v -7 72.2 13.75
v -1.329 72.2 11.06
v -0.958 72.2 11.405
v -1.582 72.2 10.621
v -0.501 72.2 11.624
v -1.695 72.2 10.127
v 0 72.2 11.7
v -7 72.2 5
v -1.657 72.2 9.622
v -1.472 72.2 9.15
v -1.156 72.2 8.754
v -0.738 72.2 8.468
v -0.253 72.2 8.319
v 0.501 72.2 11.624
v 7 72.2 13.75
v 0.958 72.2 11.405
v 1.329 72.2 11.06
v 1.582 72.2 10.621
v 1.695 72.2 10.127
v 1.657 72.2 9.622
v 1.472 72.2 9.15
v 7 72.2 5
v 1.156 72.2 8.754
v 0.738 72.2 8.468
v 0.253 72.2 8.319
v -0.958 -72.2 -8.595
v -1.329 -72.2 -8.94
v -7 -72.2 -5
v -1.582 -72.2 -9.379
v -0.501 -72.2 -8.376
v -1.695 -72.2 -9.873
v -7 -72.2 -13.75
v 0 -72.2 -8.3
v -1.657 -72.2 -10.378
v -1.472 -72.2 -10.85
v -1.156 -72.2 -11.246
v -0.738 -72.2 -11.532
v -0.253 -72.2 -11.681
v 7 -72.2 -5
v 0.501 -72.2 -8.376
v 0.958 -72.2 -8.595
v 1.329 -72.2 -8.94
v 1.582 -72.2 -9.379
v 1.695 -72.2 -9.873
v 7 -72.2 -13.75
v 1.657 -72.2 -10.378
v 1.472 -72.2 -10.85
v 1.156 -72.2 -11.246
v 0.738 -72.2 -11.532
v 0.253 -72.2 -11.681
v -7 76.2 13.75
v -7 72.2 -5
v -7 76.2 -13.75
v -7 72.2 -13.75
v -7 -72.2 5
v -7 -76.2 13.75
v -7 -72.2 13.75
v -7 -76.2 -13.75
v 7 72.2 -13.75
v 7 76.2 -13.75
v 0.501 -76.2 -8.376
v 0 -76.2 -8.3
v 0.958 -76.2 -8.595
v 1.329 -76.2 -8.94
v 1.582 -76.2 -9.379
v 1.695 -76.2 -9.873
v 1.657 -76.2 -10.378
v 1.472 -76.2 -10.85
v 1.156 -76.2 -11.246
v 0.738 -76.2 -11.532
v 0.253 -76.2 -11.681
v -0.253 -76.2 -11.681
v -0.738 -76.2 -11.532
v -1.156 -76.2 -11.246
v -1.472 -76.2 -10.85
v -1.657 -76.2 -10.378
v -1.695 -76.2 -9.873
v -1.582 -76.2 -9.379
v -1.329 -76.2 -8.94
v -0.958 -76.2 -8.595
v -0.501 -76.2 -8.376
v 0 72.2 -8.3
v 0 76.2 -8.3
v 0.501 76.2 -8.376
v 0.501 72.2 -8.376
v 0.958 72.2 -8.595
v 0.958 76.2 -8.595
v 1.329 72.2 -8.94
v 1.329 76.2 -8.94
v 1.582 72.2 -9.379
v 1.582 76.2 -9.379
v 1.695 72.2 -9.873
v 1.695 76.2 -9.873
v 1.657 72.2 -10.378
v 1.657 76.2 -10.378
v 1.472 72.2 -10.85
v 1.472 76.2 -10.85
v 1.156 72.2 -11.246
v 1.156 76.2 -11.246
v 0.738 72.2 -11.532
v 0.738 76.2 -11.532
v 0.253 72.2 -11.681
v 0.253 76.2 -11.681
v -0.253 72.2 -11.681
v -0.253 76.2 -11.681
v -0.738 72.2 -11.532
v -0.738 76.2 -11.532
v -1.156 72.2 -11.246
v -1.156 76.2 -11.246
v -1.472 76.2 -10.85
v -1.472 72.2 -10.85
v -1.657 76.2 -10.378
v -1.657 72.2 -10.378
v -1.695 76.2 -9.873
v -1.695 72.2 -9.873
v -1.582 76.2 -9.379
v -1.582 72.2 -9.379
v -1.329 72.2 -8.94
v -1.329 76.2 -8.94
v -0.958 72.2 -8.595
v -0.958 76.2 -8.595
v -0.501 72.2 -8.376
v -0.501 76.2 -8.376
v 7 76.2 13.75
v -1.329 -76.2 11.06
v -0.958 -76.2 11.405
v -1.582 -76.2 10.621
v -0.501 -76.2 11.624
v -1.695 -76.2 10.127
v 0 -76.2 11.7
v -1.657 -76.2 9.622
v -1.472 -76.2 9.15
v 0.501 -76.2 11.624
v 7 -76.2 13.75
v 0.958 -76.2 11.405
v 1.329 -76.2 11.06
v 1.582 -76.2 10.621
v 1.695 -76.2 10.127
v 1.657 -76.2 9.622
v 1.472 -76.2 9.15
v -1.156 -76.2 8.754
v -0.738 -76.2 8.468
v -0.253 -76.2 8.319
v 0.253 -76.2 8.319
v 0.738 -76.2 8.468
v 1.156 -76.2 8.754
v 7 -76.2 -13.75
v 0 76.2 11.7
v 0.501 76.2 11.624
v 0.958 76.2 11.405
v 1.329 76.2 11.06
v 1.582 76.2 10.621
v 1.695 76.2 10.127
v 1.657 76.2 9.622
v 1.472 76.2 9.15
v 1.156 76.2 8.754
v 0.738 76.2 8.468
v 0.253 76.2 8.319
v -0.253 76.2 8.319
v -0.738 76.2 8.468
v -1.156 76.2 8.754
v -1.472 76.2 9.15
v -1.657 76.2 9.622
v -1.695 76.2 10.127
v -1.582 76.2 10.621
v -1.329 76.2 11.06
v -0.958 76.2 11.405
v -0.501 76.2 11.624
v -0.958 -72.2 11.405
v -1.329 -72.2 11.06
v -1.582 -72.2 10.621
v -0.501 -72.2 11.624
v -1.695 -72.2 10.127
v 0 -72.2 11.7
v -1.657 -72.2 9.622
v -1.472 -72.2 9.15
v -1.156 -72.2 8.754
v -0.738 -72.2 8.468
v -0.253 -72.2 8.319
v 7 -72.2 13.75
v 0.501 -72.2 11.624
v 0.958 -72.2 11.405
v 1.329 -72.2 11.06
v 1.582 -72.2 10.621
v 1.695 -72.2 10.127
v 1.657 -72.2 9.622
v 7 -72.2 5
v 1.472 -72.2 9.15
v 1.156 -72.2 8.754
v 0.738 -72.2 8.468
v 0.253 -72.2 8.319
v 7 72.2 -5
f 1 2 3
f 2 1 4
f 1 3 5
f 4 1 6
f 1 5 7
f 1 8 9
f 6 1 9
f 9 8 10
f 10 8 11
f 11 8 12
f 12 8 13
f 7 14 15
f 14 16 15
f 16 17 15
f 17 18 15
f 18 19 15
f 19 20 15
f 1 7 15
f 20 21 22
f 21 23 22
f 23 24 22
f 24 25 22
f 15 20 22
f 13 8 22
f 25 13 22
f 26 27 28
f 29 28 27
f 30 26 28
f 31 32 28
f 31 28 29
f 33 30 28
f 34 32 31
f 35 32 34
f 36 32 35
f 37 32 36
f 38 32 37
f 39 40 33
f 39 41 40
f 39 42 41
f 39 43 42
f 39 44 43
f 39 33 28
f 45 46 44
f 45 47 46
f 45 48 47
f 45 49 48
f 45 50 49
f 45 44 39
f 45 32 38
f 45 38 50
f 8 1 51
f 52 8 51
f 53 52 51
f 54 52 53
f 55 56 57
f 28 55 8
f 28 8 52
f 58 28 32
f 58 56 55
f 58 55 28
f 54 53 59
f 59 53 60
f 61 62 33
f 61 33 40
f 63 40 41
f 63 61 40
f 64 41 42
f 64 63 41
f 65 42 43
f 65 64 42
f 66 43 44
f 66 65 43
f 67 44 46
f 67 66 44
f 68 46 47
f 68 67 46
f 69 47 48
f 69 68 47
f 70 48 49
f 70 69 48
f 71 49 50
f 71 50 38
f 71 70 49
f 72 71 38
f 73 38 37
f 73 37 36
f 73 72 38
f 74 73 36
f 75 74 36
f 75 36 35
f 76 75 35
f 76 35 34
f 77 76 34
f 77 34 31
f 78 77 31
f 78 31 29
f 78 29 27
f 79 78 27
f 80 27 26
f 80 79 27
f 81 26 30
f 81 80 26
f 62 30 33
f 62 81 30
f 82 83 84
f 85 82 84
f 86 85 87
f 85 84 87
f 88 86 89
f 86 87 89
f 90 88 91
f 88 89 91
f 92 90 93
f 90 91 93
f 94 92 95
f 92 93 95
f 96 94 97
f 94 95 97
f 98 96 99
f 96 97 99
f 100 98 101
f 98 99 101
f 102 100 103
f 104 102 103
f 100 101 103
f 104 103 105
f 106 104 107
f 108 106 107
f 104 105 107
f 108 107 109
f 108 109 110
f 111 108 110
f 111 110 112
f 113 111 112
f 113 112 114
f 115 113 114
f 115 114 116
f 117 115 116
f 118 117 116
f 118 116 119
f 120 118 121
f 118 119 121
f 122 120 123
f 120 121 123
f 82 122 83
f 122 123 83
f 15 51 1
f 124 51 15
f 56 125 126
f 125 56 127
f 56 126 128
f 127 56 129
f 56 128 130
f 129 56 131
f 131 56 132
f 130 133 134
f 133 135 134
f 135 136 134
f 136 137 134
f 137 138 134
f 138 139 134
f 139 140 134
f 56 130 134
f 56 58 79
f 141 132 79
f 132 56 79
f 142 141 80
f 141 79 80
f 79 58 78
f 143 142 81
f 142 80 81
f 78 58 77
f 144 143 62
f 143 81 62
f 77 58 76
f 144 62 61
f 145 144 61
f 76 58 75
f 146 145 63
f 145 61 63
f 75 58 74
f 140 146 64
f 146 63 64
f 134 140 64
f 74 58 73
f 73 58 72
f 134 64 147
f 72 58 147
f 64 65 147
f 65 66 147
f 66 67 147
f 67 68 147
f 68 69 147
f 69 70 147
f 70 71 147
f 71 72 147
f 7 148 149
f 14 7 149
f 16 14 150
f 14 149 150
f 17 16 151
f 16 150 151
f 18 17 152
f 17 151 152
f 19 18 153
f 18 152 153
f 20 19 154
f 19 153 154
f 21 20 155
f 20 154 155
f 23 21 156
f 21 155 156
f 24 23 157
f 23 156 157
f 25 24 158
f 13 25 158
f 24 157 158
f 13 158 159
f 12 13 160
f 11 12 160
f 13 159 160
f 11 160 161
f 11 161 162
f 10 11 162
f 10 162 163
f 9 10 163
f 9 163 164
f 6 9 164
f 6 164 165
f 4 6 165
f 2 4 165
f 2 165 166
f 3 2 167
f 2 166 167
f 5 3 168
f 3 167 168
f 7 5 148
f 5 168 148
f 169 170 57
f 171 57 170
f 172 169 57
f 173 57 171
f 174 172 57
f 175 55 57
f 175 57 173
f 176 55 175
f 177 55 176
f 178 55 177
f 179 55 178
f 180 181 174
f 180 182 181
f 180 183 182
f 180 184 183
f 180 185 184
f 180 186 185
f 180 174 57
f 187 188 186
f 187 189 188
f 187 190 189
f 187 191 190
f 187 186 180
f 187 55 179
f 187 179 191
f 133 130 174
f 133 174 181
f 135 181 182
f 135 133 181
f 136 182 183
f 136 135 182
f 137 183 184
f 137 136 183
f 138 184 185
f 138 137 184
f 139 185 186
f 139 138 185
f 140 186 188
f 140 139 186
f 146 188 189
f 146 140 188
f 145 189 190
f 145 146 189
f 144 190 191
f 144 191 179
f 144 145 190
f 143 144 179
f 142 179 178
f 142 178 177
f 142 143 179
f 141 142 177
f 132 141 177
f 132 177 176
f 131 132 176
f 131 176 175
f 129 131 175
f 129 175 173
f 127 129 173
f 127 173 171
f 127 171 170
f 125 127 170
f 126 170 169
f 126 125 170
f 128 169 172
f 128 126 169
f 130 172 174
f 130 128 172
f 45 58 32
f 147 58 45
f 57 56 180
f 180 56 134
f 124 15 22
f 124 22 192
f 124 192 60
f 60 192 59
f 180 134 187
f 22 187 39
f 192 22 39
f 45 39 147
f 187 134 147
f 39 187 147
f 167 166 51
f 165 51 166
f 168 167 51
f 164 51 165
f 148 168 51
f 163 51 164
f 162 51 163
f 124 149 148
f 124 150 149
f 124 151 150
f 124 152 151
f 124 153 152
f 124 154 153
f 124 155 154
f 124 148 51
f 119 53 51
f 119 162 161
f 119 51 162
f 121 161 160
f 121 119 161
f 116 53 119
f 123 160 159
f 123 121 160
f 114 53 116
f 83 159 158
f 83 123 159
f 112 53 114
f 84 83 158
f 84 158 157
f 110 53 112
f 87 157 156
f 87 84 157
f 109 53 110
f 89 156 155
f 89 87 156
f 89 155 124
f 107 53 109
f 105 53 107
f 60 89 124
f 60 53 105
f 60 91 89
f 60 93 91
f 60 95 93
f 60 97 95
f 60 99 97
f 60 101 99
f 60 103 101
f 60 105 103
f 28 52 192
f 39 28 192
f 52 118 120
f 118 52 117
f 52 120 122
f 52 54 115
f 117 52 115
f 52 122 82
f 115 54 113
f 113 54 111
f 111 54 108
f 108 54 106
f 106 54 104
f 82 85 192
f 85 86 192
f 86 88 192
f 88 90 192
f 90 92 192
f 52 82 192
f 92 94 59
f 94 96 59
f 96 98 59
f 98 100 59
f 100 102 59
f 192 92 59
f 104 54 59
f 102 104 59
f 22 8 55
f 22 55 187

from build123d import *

# Parameters (mm, degrees)
SKETCH1_W           = 14
SKETCH1_H           = 10
BOSS_EXTRUDE1_DEPTH = 76.2
SKETCH3_W           = 14
SKETCH3_H           = 27.5
SKETCH3_R           = 1.7
BOSS_EXTRUDE3_DEPTH = 4


with BuildPart() as part:
    # Sketch1 → Boss-Extrude1 (new, symmetric)
    with BuildSketch(Plane(origin=(0, 0, 0), x_dir=(1, 0, 0), z_dir=(0, 1, 0))):
        Rectangle(SKETCH1_W, SKETCH1_H)
    extrude(amount=BOSS_EXTRUDE1_DEPTH, both=True)

    # Sketch3 → Boss-Extrude3 (add)
    with BuildSketch(Plane(origin=(0, 76.2, 0), x_dir=(1, 0, 0), z_dir=(0, 1, 0))):
        Rectangle(SKETCH3_W, SKETCH3_H)
        with Locations(Location((0, 10, 0), (0, 0, 270))):
            Circle(SKETCH3_R, mode=Mode.SUBTRACT)
        with Locations(Location((0, -10, 0), (0, 0, 270))):
            Circle(SKETCH3_R, mode=Mode.SUBTRACT)
    boss_extrude3 = extrude(amount=-BOSS_EXTRUDE3_DEPTH)

    # Mirror1: Boss-Extrude3 across plane
    add(boss_extrude3.mirror(Plane.ZX))


solid = part.part
